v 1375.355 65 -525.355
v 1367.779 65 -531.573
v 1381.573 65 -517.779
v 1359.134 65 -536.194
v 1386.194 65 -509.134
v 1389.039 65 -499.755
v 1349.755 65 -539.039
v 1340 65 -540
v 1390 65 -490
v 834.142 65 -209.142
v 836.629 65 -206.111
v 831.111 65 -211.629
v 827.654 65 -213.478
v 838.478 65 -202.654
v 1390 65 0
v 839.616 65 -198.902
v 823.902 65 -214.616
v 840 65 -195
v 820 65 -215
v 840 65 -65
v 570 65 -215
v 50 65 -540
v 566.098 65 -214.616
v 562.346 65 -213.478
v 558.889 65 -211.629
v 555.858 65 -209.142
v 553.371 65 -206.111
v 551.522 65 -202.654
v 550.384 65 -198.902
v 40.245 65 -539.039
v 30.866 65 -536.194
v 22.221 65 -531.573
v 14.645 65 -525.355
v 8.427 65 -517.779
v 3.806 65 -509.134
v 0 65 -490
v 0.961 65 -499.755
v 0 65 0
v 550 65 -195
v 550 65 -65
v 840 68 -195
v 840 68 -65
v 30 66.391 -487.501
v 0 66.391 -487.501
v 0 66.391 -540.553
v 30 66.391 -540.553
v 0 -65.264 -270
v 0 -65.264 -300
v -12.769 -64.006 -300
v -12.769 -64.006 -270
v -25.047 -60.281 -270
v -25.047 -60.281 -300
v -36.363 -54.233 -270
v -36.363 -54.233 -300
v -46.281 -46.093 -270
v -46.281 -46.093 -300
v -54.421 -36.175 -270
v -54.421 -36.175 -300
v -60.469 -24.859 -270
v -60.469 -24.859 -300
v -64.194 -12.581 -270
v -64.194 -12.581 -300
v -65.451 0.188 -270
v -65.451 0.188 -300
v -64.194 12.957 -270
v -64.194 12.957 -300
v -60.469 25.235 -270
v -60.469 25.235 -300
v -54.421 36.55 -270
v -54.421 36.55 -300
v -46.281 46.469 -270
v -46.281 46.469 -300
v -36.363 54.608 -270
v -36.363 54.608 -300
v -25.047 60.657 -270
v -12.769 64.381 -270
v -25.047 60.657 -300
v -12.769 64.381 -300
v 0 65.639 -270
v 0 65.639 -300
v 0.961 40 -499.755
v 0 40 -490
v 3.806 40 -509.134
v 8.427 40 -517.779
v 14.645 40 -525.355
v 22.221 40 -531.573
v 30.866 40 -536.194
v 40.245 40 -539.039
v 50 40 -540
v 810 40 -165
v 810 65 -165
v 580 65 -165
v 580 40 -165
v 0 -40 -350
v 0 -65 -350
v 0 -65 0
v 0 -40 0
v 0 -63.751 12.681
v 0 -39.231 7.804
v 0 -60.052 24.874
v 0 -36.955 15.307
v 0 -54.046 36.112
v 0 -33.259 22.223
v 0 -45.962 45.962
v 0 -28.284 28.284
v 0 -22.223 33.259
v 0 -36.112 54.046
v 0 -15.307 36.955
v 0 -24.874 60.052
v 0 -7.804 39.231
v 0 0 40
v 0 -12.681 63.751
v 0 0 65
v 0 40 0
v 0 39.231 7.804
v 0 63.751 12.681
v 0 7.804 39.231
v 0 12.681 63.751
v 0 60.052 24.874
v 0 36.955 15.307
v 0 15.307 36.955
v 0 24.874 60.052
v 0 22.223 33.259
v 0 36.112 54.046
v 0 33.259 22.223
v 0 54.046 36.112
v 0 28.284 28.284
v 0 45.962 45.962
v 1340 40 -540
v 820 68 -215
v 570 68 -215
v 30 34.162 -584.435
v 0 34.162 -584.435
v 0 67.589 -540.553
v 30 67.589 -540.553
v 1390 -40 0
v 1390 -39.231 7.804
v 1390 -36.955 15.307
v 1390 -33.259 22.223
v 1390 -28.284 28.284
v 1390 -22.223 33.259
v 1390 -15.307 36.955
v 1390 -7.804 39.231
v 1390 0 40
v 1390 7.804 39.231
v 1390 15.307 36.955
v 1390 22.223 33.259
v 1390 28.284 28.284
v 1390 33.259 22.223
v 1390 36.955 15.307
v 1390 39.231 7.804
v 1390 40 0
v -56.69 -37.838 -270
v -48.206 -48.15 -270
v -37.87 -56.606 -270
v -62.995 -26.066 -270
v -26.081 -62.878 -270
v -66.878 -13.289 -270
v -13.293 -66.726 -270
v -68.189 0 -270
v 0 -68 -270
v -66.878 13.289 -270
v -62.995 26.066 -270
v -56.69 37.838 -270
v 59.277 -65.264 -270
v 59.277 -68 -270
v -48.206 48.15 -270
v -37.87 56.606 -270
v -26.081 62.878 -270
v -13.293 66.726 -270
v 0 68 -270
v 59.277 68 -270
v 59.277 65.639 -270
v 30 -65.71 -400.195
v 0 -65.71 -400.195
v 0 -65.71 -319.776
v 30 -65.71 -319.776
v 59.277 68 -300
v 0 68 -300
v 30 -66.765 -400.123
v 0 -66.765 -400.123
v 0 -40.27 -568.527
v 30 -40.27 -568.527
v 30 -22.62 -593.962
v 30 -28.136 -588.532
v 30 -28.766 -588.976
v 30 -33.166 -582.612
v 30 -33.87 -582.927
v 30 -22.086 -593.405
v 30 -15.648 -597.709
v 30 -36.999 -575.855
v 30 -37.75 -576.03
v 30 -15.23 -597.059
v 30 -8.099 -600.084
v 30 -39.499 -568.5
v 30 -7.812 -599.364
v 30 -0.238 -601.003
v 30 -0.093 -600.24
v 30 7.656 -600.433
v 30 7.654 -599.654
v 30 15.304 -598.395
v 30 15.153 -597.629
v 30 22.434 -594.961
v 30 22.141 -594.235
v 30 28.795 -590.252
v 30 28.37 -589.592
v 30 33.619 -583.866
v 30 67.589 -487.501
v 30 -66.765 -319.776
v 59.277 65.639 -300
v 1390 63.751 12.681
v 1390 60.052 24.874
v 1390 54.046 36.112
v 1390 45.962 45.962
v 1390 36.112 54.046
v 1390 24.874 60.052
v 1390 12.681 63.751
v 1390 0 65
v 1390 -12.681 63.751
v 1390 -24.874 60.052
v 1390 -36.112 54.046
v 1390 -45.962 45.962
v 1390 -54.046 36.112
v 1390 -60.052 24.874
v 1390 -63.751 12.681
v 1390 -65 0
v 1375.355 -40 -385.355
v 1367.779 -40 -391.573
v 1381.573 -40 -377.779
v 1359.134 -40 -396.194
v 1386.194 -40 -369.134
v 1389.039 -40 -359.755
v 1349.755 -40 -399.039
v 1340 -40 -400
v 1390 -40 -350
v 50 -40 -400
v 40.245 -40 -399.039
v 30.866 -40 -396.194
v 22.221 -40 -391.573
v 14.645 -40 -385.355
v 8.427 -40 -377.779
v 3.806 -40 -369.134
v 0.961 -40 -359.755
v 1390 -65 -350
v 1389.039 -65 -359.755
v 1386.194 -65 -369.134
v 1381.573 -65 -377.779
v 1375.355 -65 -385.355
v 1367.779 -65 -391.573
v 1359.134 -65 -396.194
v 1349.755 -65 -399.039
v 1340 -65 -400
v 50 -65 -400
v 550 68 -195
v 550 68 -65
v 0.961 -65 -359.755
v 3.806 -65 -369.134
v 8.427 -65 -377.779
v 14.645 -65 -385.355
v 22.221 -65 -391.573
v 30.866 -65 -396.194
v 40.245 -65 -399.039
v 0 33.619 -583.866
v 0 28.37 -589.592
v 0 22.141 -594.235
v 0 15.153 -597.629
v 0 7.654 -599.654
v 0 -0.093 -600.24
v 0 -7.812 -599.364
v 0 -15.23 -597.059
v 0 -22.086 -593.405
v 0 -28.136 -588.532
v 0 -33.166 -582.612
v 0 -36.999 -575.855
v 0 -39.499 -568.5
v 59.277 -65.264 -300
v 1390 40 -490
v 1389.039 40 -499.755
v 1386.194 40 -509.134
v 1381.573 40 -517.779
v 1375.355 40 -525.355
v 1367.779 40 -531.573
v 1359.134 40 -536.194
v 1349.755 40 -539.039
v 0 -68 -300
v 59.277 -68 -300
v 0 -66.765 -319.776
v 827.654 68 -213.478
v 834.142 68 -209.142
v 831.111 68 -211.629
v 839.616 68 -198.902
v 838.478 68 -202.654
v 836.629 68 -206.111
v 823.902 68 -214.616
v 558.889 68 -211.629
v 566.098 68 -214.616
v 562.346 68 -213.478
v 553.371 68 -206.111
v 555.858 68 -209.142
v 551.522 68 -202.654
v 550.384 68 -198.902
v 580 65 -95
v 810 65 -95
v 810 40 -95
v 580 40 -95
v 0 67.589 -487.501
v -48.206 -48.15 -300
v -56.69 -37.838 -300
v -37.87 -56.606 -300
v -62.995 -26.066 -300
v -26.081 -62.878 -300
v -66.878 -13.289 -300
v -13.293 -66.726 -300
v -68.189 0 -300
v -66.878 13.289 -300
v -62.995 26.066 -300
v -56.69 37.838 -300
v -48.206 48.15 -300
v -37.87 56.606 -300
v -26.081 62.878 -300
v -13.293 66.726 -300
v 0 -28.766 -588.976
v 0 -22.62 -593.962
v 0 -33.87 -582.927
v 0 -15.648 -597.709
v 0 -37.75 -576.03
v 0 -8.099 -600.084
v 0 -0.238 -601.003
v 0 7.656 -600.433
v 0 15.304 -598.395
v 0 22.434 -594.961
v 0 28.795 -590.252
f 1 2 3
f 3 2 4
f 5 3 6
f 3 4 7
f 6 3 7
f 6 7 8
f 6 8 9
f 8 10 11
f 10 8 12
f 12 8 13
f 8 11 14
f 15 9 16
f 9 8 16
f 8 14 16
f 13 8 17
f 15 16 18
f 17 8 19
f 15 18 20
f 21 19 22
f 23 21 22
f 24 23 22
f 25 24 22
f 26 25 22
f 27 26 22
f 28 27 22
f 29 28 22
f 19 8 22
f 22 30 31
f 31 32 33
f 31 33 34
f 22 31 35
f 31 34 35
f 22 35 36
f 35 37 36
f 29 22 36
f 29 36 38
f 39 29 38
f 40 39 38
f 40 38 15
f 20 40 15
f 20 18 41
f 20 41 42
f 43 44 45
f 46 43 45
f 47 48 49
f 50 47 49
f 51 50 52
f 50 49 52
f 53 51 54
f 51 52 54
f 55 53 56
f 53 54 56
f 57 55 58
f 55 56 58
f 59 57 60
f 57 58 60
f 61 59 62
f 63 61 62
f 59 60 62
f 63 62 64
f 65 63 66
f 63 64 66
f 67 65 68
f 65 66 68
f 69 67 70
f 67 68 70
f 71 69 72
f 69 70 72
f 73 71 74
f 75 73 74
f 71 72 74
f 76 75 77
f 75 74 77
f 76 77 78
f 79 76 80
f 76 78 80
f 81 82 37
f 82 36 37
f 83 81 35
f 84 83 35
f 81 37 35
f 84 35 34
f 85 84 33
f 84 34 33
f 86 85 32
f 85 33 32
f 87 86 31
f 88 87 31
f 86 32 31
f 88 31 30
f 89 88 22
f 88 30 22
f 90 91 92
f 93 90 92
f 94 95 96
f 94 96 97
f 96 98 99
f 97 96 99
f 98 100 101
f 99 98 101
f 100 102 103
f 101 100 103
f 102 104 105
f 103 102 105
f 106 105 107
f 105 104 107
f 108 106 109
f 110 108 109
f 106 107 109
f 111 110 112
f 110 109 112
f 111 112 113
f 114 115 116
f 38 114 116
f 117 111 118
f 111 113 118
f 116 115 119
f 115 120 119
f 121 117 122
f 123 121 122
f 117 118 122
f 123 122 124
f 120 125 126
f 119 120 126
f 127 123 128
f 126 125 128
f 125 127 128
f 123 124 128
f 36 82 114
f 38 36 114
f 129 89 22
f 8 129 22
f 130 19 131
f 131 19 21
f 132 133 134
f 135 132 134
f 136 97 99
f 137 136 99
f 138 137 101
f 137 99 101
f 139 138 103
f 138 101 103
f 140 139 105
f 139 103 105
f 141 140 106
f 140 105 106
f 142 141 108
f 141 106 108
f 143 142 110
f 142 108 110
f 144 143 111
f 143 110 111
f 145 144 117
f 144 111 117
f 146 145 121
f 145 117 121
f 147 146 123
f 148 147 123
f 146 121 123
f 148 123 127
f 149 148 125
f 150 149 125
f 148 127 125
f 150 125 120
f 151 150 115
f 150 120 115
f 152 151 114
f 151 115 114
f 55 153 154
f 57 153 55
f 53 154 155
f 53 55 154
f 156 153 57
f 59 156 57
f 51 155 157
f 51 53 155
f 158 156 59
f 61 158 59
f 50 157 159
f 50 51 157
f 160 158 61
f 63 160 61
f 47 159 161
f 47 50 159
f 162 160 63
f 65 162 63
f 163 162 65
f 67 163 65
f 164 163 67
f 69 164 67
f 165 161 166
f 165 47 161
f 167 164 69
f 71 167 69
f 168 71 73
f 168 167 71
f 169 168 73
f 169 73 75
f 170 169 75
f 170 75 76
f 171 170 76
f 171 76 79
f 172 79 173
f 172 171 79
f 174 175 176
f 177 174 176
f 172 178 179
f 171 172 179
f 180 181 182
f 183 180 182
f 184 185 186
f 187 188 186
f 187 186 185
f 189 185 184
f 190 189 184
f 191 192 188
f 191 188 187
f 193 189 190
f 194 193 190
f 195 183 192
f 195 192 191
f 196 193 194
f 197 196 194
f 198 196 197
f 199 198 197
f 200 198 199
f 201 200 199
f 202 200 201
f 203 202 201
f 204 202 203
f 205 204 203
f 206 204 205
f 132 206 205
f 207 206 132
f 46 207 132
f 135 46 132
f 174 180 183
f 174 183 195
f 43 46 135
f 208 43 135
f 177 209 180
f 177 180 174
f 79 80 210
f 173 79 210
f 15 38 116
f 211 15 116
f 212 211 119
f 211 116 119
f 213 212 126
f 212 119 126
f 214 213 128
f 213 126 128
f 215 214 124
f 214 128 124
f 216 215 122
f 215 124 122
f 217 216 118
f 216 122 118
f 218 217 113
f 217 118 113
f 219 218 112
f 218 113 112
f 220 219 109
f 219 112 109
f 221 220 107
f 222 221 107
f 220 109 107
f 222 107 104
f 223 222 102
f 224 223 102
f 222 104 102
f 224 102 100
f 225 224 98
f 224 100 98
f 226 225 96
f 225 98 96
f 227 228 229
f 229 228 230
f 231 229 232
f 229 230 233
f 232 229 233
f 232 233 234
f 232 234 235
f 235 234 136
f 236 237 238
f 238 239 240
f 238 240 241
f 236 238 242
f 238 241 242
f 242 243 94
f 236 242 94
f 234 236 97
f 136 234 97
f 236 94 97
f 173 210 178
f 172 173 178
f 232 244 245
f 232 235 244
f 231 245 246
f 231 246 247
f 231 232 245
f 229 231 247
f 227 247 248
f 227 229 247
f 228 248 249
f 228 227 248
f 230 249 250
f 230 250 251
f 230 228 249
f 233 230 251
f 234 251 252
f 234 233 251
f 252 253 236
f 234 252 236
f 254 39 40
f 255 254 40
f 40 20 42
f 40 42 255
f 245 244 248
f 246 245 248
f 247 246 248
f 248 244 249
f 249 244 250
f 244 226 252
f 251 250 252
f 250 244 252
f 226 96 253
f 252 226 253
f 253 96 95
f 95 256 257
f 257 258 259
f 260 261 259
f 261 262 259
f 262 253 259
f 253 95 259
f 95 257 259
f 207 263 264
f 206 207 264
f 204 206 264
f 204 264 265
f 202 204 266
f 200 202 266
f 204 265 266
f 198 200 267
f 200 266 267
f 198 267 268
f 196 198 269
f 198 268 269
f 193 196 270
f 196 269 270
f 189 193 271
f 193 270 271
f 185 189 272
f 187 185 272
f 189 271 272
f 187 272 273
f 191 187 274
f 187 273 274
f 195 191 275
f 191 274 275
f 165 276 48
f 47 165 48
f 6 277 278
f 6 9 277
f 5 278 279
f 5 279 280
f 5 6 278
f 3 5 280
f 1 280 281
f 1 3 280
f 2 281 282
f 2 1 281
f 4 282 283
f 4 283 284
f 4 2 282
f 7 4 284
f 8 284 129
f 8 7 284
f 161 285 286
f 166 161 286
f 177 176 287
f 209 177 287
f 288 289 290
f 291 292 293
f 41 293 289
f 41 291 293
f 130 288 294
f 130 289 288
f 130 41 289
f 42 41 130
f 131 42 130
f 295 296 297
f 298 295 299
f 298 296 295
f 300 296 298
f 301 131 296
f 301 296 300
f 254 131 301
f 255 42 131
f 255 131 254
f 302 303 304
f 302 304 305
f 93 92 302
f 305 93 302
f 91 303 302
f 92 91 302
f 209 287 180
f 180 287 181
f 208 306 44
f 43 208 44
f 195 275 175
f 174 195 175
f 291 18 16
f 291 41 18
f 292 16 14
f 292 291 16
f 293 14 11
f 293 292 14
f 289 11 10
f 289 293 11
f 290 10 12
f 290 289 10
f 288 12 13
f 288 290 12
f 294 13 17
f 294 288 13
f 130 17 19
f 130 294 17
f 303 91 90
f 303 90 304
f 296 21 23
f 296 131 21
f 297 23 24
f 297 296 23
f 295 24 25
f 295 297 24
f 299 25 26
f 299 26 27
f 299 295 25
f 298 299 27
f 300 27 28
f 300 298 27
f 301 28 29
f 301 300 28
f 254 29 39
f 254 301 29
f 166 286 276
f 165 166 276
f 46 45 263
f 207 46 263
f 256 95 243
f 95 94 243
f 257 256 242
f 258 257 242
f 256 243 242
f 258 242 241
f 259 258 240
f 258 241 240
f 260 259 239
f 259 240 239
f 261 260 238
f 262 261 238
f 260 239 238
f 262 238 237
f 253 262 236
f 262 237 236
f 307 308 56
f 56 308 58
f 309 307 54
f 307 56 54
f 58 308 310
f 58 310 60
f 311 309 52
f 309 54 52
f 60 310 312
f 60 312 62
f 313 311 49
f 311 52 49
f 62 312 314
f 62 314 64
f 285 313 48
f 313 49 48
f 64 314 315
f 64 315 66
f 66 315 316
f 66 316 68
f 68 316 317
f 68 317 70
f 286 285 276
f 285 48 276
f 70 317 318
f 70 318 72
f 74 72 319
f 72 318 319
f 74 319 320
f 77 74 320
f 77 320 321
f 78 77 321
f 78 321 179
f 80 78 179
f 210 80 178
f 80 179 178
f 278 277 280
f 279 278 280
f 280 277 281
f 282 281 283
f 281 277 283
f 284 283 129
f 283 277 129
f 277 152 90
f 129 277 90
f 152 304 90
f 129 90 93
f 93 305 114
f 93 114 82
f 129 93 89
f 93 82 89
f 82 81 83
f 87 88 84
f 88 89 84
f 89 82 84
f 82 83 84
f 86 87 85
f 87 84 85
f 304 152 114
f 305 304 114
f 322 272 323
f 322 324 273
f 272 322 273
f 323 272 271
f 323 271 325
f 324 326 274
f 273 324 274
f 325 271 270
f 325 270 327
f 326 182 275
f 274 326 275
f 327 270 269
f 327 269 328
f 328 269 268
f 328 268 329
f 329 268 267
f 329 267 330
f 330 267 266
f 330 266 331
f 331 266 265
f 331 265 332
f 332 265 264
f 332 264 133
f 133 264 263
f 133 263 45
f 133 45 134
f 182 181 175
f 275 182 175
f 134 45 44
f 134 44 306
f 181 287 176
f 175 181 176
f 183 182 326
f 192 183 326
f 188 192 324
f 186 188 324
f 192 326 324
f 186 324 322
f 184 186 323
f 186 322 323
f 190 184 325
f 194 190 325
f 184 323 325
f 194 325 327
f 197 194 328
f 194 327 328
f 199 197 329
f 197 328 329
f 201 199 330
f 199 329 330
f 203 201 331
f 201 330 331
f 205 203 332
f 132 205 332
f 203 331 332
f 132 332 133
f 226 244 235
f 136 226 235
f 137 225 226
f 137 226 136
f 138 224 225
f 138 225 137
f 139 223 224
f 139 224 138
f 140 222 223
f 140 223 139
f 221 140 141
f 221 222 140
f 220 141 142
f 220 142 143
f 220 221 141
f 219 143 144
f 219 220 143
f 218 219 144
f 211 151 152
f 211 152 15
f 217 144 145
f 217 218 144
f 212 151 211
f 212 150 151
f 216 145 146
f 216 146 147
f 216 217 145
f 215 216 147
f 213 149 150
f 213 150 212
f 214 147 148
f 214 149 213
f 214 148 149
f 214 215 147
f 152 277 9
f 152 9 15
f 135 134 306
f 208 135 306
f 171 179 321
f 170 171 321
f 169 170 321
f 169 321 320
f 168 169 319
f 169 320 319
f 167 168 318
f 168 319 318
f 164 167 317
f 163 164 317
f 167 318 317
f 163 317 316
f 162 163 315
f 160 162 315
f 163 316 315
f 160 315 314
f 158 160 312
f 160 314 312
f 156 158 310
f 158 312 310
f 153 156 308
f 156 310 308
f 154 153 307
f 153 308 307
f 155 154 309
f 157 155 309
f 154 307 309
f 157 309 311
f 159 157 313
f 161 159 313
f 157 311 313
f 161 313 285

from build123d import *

# Parameters (mm, degrees)
F1_DEPTH  = 1390
F2_W      = 230
F2_H      = 70
F3_DEPTH  = 25
F4_R      = 50
F5_DEPTH  = 30
F8_DEPTH  = 30
F9_W      = 290
F9_H      = 150
F9_W_2    = 230
F9_H_2    = 70
F10_DEPTH = 3
F11_R     = 20


with BuildPart() as f1:
    # F0 (on Right) → F1 (new body)
    with BuildSketch(Plane.YZ):
        with BuildLine():
            ThreePointArc((65, 0), (0, 65), (-65, 0))
            Line((-65, 0), (-65, -400))
            Line((-65, -400), (-40, -400))
            Line((-40, -400), (-40, 0))
            ThreePointArc((-40, 0), (0, 40), (40, 0))
            Line((40, 0), (40, -540))
            Line((40, -540), (65, -540))
            Line((65, -540), (65, 0))
        make_face()
    extrude(amount=F1_DEPTH)

    # F2 (on face) → F3 (cut, through all)
    with BuildSketch(Plane(origin=(0, 65, 0), x_dir=(-1, 0, 0), z_dir=(0, 1, 0))):
        with Locations((-695, -130)):
            Rectangle(F2_W, F2_H)
    extrude(amount=-F3_DEPTH, mode=Mode.SUBTRACT)

    # F4
    f4_edges = [f1.edges().sort_by_distance(p)[0] for p in [
        (1390, 52.5, -540),
        (0, 52.5, -540),
        (0, -52.5, -400),
        (1390, -52.5, -400),
    ]]
    fillet(f4_edges, radius=F4_R)

    # F9 (on face) → F10 (join)
    with BuildSketch(Plane(origin=(0, 65, 0), x_dir=(-1, 0, 0), z_dir=(0, 1, 0))):
        with Locations((-695, -140)):
            Rectangle(F9_W, F9_H)
        with Locations((-695, -130)):
            Rectangle(F9_W_2, F9_H_2, mode=Mode.SUBTRACT)
        with Locations((-695, -130)):
            Rectangle(F9_W_2, F9_H_2)
    extrude(amount=F10_DEPTH)

    # F11
    f11_edges = [f1.edges().sort_by_distance(p)[0] for p in [
        (840, 66.5, -215),
        (550, 66.5, -215),
    ]]
    fillet(f11_edges, radius=F11_R)


with BuildPart() as f5:
    # F0 (on Right) → F5 (new body)
    with BuildSketch(Plane.YZ):
        with BuildLine():
            Line((67.589127, -487.500817), (66.390976, -487.500817))
            Line((66.390976, -487.500817), (66.390976, -540.552855))
            Line((66.390976, -540.552855), (33.6189, -583.865774))
            ThreePointArc((33.6189, -583.865774), (-7.811794, -599.364146), (-39.499422, -568.499989))
            Line((-39.499422, -568.499989), (-65.709807, -400.19536))
            Line((-65.709807, -400.19536), (-65.709807, -319.776297))
            Line((-65.709807, -319.776297), (-66.764809, -319.776297))
            Line((-66.764809, -319.776297), (-66.764809, -400.12297))
            Line((-66.764809, -400.12297), (-40.270056, -568.527225))
            ThreePointArc((-40.270056, -568.527225), (-8.098614, -600.083801), (34.161845, -584.435387))
            Line((34.161845, -584.435387), (67.589127, -540.552855))
            Line((67.589127, -540.552855), (67.589127, -487.500817))
        make_face()
    extrude(amount=F5_DEPTH)


with BuildPart() as f8:
    # F7 (on offset) → F8 (new body)
    with BuildSketch(Plane.XY.offset(-300)):
        with BuildLine():
            Line((59.277002, 65.638982), (59.277002, 68))
            Line((59.277002, 68), (0, 68))
            ThreePointArc((0, 68), (-68.189298, 0), (0, -68))
            Line((0, -68), (59.277002, -68))
            Line((59.277002, -68), (59.277002, -65.263636))
            Line((59.277002, -65.263636), (0, -65.263636))
            ThreePointArc((0, -65.263636), (-65.451309, 0.187673), (0, 65.638982))
            Line((0, 65.638982), (59.277002, 65.638982))
        make_face()
    extrude(amount=F8_DEPTH)


solid = Compound([f1.part, f5.part, f8.part])
